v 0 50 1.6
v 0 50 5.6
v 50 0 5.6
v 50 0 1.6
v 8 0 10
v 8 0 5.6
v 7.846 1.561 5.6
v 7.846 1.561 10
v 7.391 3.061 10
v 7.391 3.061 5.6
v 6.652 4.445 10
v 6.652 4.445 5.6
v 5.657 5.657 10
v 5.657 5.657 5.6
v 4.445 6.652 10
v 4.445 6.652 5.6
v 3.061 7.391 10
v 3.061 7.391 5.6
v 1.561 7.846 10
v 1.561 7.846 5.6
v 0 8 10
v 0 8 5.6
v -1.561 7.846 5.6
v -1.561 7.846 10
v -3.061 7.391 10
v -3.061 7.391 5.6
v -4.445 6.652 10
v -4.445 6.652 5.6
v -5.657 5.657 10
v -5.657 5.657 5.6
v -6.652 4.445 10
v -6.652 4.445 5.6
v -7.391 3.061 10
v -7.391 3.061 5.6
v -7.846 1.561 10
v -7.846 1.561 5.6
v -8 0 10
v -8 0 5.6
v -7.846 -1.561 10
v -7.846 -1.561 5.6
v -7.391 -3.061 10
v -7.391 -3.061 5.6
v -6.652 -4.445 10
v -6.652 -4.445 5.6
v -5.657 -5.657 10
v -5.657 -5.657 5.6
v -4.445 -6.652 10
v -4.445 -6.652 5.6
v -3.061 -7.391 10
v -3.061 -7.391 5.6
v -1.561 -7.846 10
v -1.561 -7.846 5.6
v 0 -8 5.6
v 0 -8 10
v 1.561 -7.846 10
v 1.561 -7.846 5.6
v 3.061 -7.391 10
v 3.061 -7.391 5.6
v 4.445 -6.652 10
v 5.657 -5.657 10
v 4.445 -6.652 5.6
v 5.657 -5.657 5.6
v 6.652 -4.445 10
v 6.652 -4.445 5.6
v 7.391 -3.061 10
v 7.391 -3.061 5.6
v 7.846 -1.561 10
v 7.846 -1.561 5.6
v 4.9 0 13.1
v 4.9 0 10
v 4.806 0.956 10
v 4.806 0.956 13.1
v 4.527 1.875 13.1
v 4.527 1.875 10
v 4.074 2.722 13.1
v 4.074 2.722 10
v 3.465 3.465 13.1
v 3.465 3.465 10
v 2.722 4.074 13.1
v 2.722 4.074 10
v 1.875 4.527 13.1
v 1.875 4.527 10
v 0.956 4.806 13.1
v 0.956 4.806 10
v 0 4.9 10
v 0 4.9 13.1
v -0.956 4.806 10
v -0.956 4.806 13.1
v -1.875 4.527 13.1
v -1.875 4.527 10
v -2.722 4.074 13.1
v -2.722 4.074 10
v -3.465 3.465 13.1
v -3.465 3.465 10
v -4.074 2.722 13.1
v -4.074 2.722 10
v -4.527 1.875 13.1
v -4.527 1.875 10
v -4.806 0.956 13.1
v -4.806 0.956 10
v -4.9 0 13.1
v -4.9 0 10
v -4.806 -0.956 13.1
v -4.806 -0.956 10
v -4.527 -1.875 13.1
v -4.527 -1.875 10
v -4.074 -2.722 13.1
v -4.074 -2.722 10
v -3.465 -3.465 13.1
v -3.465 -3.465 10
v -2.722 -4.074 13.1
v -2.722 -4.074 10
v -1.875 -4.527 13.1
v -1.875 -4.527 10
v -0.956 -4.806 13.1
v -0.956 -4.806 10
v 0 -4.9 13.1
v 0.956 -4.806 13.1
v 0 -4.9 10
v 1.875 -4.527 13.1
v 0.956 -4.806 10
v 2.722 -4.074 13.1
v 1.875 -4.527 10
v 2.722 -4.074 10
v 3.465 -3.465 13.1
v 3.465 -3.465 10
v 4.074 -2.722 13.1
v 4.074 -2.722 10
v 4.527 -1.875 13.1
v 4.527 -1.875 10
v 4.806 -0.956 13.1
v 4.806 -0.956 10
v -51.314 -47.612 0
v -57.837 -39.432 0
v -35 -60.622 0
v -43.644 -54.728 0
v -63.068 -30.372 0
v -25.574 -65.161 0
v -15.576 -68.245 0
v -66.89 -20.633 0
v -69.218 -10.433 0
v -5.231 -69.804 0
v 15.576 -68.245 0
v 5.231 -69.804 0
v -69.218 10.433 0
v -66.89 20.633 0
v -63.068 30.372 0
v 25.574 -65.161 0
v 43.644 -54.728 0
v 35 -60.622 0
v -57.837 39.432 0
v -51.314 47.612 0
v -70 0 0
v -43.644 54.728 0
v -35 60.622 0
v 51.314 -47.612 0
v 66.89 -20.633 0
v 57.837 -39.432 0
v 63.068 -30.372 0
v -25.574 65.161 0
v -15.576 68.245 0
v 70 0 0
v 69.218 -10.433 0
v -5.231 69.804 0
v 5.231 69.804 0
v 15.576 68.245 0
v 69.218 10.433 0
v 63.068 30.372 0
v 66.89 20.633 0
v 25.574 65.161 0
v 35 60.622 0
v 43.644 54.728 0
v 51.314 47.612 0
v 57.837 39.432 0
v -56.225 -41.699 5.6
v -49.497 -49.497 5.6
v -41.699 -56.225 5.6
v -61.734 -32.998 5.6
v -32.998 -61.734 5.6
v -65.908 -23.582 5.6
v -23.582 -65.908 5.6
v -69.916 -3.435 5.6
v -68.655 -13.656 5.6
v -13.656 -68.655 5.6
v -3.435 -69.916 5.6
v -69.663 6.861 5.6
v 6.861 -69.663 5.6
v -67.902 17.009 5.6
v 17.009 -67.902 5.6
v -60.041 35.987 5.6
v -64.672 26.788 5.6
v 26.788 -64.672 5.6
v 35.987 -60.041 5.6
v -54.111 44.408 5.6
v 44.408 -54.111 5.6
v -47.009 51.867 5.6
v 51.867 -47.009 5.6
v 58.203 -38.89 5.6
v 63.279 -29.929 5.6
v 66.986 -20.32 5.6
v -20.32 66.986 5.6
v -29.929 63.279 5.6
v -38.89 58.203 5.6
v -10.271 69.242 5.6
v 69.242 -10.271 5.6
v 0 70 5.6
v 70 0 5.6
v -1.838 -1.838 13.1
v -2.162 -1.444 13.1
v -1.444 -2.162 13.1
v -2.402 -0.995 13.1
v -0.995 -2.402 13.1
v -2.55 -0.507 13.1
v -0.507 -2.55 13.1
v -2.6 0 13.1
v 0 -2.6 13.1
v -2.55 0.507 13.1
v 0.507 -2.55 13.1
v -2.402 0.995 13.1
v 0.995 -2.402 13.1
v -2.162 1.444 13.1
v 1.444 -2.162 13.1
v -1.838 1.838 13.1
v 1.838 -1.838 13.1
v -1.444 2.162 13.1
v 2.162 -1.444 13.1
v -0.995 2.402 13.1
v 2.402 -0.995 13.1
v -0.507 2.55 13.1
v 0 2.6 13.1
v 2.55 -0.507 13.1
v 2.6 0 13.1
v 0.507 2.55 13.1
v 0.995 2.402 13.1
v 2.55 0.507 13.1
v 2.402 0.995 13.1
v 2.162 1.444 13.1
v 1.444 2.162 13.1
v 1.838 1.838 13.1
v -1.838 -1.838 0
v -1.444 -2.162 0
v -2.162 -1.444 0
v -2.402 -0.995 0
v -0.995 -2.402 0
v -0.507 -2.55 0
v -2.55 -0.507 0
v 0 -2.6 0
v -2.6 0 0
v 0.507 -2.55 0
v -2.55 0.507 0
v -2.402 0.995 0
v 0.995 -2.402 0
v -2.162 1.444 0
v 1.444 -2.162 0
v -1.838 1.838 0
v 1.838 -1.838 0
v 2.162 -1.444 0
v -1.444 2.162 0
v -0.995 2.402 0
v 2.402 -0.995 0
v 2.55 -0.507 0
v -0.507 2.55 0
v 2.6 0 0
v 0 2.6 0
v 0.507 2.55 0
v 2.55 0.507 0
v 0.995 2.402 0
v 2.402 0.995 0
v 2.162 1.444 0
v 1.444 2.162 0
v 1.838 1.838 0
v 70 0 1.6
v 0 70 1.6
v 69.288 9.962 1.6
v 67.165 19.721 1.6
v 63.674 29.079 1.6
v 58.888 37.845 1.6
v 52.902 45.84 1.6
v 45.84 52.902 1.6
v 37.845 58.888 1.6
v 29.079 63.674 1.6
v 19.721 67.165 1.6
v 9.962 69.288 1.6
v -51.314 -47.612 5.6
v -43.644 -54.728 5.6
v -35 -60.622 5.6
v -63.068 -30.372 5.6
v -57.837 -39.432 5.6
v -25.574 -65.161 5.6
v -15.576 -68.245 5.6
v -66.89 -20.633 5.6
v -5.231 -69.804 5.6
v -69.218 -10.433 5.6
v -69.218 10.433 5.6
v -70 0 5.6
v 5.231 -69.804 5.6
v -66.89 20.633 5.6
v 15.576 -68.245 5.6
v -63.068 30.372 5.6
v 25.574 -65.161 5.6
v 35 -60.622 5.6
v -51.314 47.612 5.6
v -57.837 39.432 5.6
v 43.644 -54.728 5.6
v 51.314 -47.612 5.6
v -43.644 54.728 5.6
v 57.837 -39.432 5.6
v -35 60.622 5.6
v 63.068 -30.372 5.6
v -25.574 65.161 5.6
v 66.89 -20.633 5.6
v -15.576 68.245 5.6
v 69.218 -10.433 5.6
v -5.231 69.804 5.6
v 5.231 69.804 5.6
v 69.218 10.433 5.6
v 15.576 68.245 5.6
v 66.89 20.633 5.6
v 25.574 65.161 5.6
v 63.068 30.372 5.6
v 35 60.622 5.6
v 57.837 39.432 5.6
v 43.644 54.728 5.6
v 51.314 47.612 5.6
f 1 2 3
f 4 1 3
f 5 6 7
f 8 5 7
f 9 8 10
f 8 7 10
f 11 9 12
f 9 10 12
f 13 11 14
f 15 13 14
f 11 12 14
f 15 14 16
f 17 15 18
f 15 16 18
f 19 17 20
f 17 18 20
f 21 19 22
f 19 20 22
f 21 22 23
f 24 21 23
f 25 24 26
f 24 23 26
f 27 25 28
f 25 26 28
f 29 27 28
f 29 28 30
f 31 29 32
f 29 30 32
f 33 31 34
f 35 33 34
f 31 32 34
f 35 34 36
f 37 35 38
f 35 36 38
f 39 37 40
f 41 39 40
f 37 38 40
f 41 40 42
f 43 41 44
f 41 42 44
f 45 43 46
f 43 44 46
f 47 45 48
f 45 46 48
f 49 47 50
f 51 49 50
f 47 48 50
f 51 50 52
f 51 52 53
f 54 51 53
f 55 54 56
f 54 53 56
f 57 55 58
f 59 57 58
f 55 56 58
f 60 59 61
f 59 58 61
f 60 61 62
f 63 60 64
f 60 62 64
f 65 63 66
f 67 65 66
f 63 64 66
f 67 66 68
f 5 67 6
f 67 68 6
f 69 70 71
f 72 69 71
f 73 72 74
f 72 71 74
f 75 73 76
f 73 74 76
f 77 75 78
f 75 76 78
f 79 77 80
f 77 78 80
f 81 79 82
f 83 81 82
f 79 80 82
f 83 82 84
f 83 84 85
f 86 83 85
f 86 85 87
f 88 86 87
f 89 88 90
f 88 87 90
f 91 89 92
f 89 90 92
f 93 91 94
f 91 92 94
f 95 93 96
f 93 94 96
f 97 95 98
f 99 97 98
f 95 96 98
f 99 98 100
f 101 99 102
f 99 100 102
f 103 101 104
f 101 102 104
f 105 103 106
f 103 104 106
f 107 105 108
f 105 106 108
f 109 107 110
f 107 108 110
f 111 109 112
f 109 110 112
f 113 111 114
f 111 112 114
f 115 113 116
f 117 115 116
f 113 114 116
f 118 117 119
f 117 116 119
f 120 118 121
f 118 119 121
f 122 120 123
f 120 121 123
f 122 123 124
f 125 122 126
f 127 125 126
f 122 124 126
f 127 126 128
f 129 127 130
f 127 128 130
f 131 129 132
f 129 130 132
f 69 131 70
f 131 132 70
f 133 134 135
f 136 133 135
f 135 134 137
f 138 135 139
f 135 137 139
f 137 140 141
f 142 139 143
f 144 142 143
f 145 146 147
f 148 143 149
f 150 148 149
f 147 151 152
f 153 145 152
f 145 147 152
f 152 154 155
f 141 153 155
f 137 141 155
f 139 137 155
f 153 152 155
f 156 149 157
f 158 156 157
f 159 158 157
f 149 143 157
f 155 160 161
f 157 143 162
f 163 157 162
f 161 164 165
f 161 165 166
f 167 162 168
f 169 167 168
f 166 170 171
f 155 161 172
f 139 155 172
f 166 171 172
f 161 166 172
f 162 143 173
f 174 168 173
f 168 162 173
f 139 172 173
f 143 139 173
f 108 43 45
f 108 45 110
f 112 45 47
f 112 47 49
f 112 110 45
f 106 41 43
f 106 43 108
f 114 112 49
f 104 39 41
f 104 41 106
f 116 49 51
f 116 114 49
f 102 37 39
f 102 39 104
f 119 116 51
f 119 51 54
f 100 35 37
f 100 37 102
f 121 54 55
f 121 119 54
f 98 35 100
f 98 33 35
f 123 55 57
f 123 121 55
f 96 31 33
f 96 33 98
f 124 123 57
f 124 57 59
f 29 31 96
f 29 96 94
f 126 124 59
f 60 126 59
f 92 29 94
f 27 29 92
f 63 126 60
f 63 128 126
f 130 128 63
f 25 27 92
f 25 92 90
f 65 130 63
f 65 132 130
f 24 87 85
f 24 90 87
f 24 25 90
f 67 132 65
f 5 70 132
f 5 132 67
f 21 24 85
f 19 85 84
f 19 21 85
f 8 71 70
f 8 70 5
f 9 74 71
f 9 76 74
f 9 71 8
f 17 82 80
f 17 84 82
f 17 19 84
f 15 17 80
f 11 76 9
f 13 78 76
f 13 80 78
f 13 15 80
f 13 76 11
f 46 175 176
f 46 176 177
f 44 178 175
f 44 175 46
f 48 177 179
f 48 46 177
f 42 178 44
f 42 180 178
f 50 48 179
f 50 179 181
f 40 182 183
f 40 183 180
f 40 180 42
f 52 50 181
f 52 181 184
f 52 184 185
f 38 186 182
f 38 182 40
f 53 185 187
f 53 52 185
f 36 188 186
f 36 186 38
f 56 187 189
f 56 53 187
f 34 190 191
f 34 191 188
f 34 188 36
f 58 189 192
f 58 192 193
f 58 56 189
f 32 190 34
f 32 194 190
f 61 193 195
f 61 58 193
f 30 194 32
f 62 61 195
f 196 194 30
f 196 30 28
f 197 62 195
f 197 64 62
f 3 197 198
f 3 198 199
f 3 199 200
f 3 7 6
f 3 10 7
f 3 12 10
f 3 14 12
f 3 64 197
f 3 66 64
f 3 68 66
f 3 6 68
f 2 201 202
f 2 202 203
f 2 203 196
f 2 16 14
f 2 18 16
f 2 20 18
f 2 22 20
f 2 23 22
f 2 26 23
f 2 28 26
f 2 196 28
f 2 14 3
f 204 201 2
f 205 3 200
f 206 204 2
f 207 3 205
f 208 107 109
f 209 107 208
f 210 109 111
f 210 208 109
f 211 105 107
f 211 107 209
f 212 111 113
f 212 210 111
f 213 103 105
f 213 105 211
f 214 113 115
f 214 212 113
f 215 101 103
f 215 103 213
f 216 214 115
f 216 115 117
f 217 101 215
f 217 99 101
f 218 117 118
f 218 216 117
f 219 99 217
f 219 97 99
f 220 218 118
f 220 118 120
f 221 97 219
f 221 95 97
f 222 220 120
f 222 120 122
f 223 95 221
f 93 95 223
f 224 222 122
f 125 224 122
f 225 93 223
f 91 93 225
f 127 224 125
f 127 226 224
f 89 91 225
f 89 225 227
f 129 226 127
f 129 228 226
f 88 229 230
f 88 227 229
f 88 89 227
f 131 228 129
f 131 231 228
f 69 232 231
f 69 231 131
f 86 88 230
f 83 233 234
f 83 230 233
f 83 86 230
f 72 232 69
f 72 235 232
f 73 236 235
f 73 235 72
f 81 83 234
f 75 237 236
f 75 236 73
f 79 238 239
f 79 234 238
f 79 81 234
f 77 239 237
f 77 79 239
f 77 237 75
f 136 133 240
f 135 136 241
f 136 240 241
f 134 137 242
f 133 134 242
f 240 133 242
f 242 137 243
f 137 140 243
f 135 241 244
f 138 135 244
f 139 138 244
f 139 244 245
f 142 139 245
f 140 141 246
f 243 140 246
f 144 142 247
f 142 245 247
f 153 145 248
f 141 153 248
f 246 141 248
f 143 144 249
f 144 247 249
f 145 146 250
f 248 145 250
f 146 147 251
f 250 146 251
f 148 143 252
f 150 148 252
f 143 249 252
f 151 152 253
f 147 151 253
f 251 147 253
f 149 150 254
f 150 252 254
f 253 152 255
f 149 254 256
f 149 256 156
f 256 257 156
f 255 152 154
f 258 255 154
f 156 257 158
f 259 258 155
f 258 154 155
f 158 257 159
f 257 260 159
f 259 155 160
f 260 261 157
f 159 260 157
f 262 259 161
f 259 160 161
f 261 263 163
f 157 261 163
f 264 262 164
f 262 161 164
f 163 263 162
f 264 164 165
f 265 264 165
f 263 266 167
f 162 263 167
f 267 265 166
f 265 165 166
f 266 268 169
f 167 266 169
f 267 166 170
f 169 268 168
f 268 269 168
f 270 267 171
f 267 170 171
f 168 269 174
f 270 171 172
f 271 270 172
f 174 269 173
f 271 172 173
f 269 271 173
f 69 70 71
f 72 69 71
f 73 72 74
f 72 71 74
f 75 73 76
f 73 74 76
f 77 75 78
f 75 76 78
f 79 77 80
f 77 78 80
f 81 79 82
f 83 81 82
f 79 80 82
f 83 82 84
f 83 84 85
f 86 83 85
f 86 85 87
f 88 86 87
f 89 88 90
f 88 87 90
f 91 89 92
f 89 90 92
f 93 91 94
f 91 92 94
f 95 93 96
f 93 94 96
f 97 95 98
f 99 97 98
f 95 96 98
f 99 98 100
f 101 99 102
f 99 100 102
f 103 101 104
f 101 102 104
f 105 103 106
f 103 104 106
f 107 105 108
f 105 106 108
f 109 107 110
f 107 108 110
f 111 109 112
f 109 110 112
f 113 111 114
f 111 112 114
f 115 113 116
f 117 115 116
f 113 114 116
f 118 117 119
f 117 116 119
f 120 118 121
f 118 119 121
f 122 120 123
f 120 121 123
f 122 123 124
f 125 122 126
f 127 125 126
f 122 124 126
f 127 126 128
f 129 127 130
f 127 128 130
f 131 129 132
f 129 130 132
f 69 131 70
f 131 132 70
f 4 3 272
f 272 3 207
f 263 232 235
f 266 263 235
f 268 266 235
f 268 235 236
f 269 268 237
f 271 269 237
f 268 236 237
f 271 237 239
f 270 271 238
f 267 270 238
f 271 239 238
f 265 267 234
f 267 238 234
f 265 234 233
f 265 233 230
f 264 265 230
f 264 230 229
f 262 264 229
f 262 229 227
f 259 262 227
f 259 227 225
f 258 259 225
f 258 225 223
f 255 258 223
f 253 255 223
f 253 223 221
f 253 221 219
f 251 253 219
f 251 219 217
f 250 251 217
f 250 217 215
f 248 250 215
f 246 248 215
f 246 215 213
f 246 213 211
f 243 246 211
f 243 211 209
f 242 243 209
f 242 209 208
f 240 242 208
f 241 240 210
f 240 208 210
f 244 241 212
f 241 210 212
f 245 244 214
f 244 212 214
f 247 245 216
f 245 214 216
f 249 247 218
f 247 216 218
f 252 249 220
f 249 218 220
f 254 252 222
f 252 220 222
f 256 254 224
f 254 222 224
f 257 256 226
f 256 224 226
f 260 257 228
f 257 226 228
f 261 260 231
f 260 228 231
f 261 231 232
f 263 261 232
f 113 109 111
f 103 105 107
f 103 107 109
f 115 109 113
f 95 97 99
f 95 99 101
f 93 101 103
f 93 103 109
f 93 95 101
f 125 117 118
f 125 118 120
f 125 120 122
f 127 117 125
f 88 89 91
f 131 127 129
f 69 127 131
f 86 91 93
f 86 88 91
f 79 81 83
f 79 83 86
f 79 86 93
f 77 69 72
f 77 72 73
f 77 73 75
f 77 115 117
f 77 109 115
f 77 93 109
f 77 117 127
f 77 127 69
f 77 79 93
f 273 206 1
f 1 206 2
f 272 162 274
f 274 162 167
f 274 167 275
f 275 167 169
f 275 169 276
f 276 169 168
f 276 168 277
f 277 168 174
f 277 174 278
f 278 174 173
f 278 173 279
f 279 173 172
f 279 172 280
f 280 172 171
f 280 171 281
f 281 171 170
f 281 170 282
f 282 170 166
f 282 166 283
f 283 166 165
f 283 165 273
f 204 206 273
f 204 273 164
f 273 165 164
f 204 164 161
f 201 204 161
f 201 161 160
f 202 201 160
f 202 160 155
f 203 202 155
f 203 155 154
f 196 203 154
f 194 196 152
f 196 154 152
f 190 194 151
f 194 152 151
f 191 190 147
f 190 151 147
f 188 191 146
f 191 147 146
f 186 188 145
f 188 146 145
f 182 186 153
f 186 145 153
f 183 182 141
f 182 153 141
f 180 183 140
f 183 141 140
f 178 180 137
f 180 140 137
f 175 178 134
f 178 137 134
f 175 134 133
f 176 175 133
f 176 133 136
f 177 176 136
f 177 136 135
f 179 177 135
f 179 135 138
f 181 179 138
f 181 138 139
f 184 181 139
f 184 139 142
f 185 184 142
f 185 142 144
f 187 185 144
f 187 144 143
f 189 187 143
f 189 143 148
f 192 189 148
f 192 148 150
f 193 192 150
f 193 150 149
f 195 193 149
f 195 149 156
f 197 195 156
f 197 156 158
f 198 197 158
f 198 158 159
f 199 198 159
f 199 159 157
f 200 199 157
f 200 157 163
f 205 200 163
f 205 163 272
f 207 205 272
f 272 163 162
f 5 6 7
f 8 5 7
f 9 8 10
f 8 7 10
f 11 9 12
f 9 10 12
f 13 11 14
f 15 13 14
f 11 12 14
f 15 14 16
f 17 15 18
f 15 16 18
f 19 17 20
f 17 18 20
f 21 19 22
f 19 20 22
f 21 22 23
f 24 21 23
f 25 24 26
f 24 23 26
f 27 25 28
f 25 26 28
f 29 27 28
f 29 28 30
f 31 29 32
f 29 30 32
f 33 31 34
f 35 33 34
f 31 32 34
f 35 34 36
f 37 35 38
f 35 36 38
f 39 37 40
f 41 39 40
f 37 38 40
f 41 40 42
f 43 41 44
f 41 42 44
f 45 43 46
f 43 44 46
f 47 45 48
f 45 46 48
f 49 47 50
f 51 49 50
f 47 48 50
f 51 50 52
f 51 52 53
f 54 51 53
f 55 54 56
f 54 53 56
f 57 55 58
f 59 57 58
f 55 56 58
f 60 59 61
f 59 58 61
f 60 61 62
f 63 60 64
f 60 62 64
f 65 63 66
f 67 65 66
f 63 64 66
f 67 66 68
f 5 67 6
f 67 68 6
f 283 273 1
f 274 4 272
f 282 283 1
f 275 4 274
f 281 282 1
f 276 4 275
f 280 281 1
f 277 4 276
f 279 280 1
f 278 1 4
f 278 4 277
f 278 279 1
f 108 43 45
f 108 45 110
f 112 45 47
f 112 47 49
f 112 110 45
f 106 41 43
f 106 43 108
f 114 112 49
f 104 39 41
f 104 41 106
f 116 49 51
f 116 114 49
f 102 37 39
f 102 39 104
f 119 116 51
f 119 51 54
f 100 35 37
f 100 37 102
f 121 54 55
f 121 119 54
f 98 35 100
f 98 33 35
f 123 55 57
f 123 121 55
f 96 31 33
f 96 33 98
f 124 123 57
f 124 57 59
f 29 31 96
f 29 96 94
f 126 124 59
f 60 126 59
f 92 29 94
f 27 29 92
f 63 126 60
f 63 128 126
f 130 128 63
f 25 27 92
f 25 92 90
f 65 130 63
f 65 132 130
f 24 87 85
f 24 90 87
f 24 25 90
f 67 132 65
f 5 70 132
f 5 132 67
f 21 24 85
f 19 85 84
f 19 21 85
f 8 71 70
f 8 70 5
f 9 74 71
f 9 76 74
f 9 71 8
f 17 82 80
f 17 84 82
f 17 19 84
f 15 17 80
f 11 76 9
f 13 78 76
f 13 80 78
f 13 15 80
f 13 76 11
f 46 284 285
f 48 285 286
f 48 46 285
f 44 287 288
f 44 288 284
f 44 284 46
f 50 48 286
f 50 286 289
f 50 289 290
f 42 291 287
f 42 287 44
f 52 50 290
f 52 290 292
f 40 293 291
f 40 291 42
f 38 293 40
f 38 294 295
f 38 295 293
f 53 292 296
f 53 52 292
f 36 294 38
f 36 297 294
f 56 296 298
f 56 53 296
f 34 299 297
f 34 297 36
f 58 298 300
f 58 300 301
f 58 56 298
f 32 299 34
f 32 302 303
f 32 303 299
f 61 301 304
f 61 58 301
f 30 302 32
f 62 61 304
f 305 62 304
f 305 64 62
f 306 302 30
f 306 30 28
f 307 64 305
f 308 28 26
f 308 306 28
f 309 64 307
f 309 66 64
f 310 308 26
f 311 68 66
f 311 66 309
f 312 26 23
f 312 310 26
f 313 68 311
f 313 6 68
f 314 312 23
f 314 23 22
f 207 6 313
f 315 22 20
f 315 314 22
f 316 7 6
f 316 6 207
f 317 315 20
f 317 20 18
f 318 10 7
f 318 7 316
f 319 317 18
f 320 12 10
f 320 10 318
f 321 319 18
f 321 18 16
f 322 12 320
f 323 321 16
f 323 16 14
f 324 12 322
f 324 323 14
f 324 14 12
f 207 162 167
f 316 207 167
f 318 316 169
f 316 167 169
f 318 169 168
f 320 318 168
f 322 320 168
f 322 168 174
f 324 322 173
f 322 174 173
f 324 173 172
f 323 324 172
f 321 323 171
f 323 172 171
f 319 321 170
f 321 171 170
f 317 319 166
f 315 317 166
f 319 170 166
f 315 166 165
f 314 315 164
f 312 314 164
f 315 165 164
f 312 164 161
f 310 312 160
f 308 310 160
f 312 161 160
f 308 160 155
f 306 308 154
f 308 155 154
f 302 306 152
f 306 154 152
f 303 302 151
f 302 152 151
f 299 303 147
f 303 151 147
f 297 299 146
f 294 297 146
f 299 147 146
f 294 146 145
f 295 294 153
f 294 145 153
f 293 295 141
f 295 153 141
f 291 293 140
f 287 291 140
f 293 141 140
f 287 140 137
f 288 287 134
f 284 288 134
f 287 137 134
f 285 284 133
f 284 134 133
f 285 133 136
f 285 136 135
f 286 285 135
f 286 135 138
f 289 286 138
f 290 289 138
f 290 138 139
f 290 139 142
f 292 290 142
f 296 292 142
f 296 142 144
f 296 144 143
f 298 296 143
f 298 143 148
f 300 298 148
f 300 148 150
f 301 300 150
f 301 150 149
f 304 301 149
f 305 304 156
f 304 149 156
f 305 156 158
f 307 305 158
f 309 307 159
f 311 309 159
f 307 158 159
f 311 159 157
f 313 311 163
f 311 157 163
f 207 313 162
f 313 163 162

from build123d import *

# Parameters (mm, degrees)
SKETCH_R        = 70
PAD_DEPTH       = 5.6
SKETCH001_R     = 8
PAD001_DEPTH    = 4.4
SKETCH002_R     = 4.9
PAD002_DEPTH    = 3.1
POCKET_DEPTH    = 4
SKETCH005_R     = 4.9
PAD003_DEPTH    = 3.1
SKETCH006_R     = 2.6
POCKET001_DEPTH = 13.101


with BuildPart() as pad001:
    # Sketch → Pad (new body)
    with BuildSketch(Plane.XY):
        Circle(SKETCH_R)
    extrude(amount=PAD_DEPTH)

    # Sketch001 → Pad001 (new body)
    with BuildSketch(Plane.XY.offset(5.6)):
        Circle(SKETCH001_R)
    extrude(amount=PAD001_DEPTH)


with BuildPart() as pad002:
    # Pad002 base: copy of Pad001
    add(pad001.part)

    # Sketch002 → Pad002 (new body)
    with BuildSketch(Plane.XY.offset(10)):
        Circle(SKETCH002_R)
    extrude(amount=PAD002_DEPTH)


with BuildPart() as pocket001:
    # Pocket base: copy of Pad001
    add(pad001.part)

    # Sketch004 → Pocket (cut)
    with BuildSketch(Plane.XY.offset(5.6)):
        Polygon((0, 100), (0, 50), (50, 0), (100, 0), align=None)
    extrude(amount=-POCKET_DEPTH, mode=Mode.SUBTRACT)

    # Sketch005 → Pad003 (new body)
    with BuildSketch(Plane.XY.offset(10)):
        Circle(SKETCH005_R)
    extrude(amount=PAD003_DEPTH)

    # Sketch006 → Pocket001 (cut, through all)
    with BuildSketch(Plane.XY.offset(13.1)):
        Circle(SKETCH006_R)
    extrude(amount=-POCKET001_DEPTH, mode=Mode.SUBTRACT)


solid = Compound([pad002.part, pocket001.part])
